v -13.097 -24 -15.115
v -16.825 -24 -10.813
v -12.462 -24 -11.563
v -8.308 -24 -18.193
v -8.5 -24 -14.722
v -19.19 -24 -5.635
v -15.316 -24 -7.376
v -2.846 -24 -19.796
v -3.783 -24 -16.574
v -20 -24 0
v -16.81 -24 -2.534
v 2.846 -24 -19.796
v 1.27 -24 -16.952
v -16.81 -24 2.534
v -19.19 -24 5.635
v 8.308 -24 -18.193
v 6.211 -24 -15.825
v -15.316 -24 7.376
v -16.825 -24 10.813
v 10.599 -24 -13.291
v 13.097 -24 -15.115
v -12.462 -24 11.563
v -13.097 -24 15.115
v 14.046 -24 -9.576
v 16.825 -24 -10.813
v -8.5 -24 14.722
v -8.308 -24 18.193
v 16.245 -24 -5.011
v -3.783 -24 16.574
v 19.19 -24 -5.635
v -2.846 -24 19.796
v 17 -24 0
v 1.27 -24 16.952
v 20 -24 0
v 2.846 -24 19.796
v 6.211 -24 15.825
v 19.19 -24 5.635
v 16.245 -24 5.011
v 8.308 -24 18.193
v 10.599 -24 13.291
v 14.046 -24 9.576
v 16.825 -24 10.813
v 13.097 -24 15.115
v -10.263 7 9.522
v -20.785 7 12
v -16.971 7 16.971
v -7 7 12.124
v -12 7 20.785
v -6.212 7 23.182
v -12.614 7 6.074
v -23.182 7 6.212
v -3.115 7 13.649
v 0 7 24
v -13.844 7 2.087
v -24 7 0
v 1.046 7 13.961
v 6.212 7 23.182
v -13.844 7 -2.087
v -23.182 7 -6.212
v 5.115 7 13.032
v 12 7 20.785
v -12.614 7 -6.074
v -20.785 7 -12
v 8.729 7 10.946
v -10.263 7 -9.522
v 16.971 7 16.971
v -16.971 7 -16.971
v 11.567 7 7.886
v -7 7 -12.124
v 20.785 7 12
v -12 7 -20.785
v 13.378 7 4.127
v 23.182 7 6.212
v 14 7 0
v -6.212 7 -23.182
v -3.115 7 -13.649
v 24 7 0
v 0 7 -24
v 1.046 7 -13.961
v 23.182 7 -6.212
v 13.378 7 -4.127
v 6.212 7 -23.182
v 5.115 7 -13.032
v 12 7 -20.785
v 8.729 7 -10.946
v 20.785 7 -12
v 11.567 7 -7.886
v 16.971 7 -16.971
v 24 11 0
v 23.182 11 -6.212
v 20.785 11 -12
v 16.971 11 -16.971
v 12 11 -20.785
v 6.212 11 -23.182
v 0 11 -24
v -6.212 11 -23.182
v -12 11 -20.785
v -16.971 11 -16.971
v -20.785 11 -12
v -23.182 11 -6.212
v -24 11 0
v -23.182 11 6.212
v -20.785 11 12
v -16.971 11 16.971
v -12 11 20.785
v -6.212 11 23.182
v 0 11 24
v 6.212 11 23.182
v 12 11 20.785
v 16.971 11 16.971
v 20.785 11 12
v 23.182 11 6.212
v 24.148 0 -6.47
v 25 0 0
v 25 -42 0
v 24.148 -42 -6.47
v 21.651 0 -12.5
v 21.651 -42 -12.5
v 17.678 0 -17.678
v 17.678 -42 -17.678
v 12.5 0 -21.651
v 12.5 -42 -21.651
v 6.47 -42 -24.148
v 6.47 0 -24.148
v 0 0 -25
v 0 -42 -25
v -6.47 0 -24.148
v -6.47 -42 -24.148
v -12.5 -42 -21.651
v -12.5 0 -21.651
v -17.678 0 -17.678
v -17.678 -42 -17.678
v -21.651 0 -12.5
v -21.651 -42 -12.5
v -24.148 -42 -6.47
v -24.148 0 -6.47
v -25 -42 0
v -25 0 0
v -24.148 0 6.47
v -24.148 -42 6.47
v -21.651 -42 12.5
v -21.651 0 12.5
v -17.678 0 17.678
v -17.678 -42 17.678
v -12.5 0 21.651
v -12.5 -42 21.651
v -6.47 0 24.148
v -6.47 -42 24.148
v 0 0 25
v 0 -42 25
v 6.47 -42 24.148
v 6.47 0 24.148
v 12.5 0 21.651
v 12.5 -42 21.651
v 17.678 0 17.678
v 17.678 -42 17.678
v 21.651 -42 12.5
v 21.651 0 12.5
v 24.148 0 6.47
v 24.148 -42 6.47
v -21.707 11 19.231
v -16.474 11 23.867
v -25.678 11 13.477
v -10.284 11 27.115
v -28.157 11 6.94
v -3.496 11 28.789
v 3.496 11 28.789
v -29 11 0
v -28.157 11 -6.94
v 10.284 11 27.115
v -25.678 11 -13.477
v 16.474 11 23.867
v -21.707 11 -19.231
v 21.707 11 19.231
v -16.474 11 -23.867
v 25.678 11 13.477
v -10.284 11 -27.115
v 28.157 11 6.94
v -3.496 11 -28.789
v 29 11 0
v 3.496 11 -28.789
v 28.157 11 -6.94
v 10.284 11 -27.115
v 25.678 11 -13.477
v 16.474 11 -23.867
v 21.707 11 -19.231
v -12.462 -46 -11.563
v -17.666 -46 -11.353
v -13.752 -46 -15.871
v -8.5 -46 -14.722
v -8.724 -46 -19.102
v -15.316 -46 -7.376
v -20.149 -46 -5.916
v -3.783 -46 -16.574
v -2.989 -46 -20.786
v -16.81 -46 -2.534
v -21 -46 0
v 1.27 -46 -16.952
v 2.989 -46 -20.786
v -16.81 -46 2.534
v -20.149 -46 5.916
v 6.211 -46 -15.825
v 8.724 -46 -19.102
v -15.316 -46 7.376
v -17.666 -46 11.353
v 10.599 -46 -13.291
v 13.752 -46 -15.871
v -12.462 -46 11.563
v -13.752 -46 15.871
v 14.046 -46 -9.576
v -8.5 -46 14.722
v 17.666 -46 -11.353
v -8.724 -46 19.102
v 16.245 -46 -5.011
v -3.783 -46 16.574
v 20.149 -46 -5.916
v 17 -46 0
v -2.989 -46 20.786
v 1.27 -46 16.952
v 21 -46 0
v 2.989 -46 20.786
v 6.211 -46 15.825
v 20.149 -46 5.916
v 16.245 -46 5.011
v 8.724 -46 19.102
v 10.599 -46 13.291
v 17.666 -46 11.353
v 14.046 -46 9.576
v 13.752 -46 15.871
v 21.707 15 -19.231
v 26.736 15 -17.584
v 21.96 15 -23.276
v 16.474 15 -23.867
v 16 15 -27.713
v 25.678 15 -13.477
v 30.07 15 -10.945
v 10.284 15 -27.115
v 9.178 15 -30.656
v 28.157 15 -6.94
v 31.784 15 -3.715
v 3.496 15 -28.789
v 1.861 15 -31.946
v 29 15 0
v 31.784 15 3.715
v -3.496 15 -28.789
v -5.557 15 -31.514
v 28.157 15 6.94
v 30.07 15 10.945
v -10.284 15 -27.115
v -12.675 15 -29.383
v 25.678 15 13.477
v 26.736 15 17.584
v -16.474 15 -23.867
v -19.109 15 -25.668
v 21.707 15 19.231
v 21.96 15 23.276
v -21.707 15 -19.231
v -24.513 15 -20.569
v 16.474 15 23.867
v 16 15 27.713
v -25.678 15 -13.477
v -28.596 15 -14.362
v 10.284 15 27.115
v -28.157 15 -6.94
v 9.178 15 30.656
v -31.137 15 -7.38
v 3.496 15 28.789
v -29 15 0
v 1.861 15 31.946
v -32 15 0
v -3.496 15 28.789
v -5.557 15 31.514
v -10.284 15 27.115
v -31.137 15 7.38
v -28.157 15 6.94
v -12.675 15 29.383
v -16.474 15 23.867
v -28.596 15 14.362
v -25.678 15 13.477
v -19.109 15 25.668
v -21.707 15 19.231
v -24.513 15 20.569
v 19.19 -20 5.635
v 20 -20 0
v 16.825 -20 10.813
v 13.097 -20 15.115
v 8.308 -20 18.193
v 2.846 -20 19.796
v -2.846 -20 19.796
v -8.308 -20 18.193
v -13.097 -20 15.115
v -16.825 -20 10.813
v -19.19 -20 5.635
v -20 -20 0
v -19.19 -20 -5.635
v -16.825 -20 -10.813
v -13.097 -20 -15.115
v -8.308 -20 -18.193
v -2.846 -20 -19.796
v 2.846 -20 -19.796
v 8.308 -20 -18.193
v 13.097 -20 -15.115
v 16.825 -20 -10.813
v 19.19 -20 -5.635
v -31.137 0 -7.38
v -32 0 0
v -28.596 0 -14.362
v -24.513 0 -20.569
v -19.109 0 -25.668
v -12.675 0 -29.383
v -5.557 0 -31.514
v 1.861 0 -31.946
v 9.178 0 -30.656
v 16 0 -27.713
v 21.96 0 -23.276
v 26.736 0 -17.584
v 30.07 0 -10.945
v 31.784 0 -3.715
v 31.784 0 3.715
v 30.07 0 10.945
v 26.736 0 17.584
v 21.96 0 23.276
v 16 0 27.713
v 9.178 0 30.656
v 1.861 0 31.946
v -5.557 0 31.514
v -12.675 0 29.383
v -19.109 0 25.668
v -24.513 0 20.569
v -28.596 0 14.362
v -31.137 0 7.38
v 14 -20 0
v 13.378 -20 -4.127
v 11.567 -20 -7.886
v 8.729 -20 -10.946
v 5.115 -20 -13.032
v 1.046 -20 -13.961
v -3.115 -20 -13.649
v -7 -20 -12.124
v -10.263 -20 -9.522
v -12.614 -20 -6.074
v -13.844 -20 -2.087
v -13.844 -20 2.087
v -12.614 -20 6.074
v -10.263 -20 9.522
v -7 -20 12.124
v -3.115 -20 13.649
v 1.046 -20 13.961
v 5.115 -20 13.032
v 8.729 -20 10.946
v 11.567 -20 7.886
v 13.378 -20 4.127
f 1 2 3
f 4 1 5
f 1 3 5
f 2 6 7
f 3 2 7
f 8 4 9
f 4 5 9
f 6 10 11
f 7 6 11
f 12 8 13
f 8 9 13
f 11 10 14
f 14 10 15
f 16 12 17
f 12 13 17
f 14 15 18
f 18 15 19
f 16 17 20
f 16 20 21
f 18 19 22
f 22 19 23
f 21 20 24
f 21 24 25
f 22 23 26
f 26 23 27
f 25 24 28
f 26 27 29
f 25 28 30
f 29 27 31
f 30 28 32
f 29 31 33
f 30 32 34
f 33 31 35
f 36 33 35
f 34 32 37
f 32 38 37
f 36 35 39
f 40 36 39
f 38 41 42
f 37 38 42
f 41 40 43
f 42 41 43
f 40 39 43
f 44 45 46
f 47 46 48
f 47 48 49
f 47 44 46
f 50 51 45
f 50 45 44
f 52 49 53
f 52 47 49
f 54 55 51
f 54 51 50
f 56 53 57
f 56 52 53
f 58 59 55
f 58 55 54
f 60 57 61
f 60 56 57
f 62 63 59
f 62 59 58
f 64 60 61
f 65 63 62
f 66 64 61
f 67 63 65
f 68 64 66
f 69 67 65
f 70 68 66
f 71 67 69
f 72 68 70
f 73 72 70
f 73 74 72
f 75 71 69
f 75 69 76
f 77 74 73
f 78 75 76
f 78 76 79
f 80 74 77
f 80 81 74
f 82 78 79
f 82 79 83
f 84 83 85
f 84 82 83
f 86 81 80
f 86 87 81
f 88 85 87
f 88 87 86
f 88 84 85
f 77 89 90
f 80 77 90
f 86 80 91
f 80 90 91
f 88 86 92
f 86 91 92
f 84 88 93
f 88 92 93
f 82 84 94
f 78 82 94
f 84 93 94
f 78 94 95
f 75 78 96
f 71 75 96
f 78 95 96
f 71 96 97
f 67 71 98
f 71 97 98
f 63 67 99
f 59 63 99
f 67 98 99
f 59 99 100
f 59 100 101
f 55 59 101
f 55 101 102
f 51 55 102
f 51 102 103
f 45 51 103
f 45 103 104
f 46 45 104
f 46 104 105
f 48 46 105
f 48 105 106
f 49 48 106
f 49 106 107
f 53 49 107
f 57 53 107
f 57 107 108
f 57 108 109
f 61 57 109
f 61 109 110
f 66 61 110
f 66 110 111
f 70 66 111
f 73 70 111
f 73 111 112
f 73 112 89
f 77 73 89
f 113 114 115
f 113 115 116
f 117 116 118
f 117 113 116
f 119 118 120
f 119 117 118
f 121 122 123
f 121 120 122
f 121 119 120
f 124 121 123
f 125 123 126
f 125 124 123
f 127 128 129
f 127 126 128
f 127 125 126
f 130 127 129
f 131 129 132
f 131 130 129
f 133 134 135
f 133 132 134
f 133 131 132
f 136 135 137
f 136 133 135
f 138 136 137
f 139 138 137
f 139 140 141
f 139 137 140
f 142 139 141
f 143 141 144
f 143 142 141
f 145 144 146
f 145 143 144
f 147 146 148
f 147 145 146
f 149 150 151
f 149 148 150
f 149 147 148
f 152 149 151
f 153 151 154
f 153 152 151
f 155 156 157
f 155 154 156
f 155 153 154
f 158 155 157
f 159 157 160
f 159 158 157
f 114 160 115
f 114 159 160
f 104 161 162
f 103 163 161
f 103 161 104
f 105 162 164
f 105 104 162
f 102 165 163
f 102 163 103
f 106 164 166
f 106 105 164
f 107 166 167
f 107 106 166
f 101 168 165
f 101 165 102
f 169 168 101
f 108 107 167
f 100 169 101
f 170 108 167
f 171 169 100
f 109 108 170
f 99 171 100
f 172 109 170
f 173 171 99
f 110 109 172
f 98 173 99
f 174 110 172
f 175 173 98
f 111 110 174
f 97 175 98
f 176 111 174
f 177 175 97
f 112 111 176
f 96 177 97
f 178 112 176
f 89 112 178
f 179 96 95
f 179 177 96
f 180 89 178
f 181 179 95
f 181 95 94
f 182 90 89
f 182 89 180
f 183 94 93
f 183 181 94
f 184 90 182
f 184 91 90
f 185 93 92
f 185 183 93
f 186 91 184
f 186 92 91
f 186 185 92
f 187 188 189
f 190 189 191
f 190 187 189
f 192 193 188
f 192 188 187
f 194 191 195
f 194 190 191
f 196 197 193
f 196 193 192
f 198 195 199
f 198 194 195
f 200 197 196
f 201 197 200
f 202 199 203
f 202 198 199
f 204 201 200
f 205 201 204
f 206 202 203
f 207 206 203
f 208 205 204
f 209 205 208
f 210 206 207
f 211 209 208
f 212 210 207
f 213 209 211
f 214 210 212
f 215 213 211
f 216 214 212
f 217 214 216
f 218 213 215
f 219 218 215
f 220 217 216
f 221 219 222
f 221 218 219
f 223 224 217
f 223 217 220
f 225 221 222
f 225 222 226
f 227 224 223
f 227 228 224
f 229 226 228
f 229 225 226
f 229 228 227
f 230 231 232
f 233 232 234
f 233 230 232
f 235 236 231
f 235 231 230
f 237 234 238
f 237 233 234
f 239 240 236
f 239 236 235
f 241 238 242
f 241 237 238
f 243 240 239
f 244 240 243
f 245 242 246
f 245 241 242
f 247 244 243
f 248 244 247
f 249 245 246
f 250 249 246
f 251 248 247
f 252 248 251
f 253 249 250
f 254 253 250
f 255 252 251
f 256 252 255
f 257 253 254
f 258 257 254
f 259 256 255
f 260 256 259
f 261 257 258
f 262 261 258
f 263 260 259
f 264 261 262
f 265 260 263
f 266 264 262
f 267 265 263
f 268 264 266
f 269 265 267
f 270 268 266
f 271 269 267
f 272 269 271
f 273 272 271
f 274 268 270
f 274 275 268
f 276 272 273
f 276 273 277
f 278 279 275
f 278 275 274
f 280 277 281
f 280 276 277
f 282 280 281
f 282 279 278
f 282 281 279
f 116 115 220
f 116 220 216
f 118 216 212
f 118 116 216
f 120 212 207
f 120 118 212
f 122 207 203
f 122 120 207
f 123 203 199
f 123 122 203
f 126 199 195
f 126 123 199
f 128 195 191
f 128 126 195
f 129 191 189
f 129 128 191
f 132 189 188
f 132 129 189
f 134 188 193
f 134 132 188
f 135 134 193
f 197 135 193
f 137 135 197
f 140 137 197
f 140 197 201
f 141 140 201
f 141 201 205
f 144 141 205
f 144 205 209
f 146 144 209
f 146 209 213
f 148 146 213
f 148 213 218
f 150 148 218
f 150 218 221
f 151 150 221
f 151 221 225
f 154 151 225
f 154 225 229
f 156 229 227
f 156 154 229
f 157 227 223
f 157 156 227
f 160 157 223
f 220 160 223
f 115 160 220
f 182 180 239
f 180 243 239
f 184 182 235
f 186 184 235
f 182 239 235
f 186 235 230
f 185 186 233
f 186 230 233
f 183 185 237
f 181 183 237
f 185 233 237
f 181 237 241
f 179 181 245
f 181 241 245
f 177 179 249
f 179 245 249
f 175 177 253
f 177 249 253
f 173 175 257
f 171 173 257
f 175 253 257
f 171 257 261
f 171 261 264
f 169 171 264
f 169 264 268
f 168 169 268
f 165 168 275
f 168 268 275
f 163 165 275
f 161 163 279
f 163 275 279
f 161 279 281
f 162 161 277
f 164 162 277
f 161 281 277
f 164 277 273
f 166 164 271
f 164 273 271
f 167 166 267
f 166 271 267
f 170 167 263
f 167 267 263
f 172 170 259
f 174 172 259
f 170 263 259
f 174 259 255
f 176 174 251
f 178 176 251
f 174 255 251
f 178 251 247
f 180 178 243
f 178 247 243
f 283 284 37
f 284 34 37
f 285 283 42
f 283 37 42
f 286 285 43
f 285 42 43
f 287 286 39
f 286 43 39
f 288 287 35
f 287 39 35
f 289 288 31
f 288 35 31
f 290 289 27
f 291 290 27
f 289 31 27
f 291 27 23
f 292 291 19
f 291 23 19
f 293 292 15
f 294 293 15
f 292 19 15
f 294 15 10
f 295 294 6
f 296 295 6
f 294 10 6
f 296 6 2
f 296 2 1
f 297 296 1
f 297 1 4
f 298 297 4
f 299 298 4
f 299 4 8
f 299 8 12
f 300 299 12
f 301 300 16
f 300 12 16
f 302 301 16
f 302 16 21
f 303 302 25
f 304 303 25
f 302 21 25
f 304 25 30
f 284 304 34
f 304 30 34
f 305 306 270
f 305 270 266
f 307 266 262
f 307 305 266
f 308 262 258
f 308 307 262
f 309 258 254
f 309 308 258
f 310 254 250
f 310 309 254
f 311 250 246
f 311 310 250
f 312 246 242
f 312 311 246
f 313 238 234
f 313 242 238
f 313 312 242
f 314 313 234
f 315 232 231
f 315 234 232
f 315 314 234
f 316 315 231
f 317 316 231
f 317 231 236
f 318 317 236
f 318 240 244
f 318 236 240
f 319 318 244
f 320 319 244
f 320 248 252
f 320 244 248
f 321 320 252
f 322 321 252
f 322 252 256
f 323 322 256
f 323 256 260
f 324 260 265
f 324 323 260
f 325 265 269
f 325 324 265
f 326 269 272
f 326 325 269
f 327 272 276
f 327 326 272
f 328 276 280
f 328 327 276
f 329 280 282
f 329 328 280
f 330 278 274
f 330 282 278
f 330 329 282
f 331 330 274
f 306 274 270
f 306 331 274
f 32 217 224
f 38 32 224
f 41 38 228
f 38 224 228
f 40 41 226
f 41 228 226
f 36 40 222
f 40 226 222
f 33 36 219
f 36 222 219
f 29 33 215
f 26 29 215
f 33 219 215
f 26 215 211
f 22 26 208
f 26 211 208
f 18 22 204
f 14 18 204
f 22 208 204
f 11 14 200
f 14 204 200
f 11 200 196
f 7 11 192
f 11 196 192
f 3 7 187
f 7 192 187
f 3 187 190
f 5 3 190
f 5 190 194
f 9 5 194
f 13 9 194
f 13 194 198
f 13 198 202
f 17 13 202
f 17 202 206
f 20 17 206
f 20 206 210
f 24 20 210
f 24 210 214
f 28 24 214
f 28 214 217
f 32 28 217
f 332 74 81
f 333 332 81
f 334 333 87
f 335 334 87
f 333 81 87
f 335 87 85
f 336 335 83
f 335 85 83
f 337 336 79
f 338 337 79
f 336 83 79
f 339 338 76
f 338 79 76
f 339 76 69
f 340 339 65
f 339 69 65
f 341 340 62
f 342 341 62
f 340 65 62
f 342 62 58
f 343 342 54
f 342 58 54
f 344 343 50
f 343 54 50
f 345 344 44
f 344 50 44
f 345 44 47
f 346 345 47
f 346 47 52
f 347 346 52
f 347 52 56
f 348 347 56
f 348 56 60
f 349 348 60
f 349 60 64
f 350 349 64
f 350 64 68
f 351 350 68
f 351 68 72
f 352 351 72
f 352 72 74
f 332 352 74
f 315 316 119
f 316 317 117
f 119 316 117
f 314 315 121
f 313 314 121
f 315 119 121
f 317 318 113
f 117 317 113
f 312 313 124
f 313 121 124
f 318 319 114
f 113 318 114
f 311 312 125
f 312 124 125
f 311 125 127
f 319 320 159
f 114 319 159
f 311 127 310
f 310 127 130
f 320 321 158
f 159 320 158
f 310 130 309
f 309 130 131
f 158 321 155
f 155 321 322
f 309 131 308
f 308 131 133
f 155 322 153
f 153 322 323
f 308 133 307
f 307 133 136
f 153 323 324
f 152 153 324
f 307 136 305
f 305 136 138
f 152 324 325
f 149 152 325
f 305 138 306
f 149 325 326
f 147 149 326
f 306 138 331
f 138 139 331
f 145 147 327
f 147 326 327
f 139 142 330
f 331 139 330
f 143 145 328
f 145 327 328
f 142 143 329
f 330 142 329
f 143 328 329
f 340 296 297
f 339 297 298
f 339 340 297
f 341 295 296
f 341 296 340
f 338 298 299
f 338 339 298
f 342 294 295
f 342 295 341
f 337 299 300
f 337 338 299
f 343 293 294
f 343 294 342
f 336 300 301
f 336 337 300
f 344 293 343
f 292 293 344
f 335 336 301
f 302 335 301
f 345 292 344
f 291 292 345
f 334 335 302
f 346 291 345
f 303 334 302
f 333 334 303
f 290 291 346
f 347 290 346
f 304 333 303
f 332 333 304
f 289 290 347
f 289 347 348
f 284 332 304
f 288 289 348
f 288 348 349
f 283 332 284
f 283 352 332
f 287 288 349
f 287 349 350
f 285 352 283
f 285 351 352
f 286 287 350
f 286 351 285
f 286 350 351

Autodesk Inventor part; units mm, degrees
ref_plane "YZ Plane" through (0, 0, 0) normal (1, 0, 0) x (0, 1, 0)
ref_plane "XZ Plane" through (0, 0, 0) normal (0, 1, 0) x (-1, 0, 0)
ref_plane "XY Plane" through (0, 0, 0) normal (0, 0, 1) x (1, 0, 0)
sketch "Sketch1" plane through (0, 0, 0) normal (0, 1, 0) x (-1, 0, 0)
  circle A0 centre (0, 0) radius 32
  dimension "d0" = 64
extrude "Extrusion1" add sketch "Sketch1" along normal blind 15
sketch "Sketch2" plane through (0, 15, 0) normal (0, 1, 0) x (1, 0, 0)
  point P0 (0, 0)
sketch "Sketch3" plane through (0, 0, 0) normal (0, -1, 0) x (1, 0, 0)
  circle A0 centre (0, 0) radius 25
  dimension "d3" = 50
extrude "Extrusion2" add sketch "Sketch3" along normal blind 46
sketch "Sketch4" plane through (0, 15, 0) normal (0, 1, 0) x (1, 0, 0)
  circle A0 centre (0, 0) radius 29
  dimension "d6" = 58
extrude "Extrusion3" cut sketch "Sketch4" against normal blind 4
sketch "Sketch5" plane through (0, 11, 0) normal (0, 1, 0) x (1, 0, 0)
  circle A0 centre (0, 0) radius 24
  dimension "d9" = 48
extrude "Extrusion4" cut sketch "Sketch5" against normal blind 4
sketch "Sketch6" plane through (0, 7, 0) normal (0, 1, 0) x (1, 0, 0)
  point P0 (0, 0)
sketch "Sketch7" plane through (0, -46, 0) normal (0, -1, 0) x (1, 0, 0)
  circle A0 centre (0, 0) radius 17
  dimension "d12" = 34
extrude "Extrusion5" cut sketch "Sketch7" against normal blind 22
sketch "Sketch8" plane through (0, -24, 0) normal (0, -1, 0) x (1, 0, 0)
  circle A0 centre (0, 0) radius 20
  dimension "d15" = 40
extrude "Extrusion6" cut sketch "Sketch8" against normal blind 4
sketch "Sketch9" plane through (0, 7, 0) normal (0, 1, 0) x (1, 0, 0)
  circle A0 centre (0, 0) radius 14
  dimension "d18" = 28
extrude "Extrusion7" cut sketch "Sketch9" against normal blind 27
chamfer "Chamfer1" distance 4 angle 45 1 edges at (-25, -46, 0)
properties part number "00.32.002 \"Fitting\"" material "Steel"
